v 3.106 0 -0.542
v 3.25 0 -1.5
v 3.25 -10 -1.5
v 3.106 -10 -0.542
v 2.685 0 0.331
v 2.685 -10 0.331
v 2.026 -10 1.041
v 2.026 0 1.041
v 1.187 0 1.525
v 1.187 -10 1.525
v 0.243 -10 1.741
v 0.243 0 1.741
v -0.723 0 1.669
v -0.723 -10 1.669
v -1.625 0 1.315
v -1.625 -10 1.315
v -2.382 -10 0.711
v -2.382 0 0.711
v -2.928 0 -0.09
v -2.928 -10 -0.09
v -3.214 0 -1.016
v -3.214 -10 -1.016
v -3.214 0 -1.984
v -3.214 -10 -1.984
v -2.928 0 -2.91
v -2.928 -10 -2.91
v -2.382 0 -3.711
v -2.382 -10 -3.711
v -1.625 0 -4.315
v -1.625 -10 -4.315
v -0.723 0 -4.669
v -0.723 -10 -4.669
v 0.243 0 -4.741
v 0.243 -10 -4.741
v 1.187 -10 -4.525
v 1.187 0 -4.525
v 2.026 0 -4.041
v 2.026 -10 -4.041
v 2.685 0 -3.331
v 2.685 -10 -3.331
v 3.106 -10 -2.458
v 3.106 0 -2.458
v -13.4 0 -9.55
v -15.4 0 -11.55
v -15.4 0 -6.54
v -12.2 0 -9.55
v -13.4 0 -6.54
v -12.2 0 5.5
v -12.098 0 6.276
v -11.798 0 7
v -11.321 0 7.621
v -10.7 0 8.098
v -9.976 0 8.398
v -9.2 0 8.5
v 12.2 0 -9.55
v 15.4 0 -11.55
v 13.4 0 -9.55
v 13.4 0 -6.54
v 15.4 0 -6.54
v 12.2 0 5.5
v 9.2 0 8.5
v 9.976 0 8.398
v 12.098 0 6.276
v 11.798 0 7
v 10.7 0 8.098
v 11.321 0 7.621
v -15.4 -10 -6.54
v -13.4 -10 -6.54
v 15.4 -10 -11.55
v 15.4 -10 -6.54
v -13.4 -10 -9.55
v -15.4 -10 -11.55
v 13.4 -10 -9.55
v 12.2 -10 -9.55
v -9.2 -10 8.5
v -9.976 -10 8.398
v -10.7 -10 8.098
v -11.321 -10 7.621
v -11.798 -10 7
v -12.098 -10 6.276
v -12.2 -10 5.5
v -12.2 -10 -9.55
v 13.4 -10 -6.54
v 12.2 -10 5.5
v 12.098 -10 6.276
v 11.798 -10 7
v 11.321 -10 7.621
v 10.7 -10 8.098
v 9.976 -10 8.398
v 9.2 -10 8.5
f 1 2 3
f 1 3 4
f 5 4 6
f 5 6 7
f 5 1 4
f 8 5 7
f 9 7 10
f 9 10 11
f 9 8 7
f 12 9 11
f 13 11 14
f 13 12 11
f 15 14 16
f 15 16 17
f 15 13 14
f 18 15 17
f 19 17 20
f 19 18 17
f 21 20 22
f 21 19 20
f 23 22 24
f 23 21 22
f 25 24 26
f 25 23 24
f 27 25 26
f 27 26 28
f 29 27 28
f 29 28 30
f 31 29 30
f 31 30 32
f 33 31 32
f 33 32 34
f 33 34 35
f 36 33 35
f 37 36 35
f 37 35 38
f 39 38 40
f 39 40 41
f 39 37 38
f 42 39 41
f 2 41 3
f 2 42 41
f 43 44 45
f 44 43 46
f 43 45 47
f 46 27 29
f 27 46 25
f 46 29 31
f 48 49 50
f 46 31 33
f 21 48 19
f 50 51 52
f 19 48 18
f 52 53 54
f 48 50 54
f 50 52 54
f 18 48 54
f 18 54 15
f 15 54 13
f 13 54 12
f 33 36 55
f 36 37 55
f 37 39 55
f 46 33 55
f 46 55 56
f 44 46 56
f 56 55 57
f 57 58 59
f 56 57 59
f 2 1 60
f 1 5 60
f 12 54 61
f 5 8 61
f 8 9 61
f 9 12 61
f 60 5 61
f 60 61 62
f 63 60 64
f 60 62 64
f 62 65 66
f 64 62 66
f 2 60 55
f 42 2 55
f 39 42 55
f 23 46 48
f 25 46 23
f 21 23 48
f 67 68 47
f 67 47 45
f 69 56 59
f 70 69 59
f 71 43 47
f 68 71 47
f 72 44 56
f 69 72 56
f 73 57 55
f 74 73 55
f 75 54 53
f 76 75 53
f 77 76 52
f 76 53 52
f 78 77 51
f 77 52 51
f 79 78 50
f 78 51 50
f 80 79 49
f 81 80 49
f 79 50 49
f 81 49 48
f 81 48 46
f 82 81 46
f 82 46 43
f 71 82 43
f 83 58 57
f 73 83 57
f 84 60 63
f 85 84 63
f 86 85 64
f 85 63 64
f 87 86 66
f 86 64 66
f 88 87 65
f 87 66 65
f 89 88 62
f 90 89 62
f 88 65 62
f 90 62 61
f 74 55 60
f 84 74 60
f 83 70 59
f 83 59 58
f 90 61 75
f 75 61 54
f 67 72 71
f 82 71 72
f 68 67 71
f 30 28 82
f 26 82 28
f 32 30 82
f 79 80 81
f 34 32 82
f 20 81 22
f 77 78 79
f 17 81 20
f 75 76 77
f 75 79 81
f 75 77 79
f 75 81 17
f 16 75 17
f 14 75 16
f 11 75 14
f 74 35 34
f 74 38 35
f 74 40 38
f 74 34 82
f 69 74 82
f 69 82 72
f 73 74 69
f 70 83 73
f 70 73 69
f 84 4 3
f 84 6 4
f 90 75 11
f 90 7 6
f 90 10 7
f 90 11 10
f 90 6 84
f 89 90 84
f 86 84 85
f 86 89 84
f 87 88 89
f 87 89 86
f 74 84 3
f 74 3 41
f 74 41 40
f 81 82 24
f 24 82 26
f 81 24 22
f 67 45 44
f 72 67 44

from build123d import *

# Parameters (mm, degrees)
F0_R     = 3.25
F1_DEPTH = 10


with BuildPart() as f1:
    # F0 (on Front) → F1 (new body)
    with BuildSketch(Plane.XZ):
        with BuildLine():
            Line((-13.4, -9.5), (-13.4, -6.540226))
            Line((-13.4, -6.540226), (-15.4, -6.540226))
            Line((-15.4, -6.540226), (-15.4, -11.55))
            Line((-15.4, -11.55), (15.4, -11.55))
            Line((15.4, -11.55), (15.4, -6.540226))
            Line((15.4, -6.540226), (13.4, -6.540226))
            Line((13.4, -6.540226), (13.4, -9.5))
            Line((13.4, -9.5), (13.4, -9.55))
            Line((13.4, -9.55), (12.2, -9.55))
            Line((12.2, -9.55), (12.2, -9.5))
            Line((12.2, -9.5), (12.2, 5.5))
            ThreePointArc((12.2, 5.5), (11.32132, 7.62132), (9.2, 8.5))
            Line((9.2, 8.5), (-9.2, 8.5))
            ThreePointArc((-9.2, 8.5), (-11.32132, 7.62132), (-12.2, 5.5))
            Line((-12.2, 5.5), (-12.2, -9.5))
            Line((-12.2, -9.5), (-12.2, -9.55))
            Line((-12.2, -9.55), (-13.4, -9.55))
            Line((-13.4, -9.55), (-13.4, -9.5))
        make_face()
        with Locations((0, -1.5)):
            Circle(F0_R, mode=Mode.SUBTRACT)
    extrude(amount=F1_DEPTH)


solid = f1.part
